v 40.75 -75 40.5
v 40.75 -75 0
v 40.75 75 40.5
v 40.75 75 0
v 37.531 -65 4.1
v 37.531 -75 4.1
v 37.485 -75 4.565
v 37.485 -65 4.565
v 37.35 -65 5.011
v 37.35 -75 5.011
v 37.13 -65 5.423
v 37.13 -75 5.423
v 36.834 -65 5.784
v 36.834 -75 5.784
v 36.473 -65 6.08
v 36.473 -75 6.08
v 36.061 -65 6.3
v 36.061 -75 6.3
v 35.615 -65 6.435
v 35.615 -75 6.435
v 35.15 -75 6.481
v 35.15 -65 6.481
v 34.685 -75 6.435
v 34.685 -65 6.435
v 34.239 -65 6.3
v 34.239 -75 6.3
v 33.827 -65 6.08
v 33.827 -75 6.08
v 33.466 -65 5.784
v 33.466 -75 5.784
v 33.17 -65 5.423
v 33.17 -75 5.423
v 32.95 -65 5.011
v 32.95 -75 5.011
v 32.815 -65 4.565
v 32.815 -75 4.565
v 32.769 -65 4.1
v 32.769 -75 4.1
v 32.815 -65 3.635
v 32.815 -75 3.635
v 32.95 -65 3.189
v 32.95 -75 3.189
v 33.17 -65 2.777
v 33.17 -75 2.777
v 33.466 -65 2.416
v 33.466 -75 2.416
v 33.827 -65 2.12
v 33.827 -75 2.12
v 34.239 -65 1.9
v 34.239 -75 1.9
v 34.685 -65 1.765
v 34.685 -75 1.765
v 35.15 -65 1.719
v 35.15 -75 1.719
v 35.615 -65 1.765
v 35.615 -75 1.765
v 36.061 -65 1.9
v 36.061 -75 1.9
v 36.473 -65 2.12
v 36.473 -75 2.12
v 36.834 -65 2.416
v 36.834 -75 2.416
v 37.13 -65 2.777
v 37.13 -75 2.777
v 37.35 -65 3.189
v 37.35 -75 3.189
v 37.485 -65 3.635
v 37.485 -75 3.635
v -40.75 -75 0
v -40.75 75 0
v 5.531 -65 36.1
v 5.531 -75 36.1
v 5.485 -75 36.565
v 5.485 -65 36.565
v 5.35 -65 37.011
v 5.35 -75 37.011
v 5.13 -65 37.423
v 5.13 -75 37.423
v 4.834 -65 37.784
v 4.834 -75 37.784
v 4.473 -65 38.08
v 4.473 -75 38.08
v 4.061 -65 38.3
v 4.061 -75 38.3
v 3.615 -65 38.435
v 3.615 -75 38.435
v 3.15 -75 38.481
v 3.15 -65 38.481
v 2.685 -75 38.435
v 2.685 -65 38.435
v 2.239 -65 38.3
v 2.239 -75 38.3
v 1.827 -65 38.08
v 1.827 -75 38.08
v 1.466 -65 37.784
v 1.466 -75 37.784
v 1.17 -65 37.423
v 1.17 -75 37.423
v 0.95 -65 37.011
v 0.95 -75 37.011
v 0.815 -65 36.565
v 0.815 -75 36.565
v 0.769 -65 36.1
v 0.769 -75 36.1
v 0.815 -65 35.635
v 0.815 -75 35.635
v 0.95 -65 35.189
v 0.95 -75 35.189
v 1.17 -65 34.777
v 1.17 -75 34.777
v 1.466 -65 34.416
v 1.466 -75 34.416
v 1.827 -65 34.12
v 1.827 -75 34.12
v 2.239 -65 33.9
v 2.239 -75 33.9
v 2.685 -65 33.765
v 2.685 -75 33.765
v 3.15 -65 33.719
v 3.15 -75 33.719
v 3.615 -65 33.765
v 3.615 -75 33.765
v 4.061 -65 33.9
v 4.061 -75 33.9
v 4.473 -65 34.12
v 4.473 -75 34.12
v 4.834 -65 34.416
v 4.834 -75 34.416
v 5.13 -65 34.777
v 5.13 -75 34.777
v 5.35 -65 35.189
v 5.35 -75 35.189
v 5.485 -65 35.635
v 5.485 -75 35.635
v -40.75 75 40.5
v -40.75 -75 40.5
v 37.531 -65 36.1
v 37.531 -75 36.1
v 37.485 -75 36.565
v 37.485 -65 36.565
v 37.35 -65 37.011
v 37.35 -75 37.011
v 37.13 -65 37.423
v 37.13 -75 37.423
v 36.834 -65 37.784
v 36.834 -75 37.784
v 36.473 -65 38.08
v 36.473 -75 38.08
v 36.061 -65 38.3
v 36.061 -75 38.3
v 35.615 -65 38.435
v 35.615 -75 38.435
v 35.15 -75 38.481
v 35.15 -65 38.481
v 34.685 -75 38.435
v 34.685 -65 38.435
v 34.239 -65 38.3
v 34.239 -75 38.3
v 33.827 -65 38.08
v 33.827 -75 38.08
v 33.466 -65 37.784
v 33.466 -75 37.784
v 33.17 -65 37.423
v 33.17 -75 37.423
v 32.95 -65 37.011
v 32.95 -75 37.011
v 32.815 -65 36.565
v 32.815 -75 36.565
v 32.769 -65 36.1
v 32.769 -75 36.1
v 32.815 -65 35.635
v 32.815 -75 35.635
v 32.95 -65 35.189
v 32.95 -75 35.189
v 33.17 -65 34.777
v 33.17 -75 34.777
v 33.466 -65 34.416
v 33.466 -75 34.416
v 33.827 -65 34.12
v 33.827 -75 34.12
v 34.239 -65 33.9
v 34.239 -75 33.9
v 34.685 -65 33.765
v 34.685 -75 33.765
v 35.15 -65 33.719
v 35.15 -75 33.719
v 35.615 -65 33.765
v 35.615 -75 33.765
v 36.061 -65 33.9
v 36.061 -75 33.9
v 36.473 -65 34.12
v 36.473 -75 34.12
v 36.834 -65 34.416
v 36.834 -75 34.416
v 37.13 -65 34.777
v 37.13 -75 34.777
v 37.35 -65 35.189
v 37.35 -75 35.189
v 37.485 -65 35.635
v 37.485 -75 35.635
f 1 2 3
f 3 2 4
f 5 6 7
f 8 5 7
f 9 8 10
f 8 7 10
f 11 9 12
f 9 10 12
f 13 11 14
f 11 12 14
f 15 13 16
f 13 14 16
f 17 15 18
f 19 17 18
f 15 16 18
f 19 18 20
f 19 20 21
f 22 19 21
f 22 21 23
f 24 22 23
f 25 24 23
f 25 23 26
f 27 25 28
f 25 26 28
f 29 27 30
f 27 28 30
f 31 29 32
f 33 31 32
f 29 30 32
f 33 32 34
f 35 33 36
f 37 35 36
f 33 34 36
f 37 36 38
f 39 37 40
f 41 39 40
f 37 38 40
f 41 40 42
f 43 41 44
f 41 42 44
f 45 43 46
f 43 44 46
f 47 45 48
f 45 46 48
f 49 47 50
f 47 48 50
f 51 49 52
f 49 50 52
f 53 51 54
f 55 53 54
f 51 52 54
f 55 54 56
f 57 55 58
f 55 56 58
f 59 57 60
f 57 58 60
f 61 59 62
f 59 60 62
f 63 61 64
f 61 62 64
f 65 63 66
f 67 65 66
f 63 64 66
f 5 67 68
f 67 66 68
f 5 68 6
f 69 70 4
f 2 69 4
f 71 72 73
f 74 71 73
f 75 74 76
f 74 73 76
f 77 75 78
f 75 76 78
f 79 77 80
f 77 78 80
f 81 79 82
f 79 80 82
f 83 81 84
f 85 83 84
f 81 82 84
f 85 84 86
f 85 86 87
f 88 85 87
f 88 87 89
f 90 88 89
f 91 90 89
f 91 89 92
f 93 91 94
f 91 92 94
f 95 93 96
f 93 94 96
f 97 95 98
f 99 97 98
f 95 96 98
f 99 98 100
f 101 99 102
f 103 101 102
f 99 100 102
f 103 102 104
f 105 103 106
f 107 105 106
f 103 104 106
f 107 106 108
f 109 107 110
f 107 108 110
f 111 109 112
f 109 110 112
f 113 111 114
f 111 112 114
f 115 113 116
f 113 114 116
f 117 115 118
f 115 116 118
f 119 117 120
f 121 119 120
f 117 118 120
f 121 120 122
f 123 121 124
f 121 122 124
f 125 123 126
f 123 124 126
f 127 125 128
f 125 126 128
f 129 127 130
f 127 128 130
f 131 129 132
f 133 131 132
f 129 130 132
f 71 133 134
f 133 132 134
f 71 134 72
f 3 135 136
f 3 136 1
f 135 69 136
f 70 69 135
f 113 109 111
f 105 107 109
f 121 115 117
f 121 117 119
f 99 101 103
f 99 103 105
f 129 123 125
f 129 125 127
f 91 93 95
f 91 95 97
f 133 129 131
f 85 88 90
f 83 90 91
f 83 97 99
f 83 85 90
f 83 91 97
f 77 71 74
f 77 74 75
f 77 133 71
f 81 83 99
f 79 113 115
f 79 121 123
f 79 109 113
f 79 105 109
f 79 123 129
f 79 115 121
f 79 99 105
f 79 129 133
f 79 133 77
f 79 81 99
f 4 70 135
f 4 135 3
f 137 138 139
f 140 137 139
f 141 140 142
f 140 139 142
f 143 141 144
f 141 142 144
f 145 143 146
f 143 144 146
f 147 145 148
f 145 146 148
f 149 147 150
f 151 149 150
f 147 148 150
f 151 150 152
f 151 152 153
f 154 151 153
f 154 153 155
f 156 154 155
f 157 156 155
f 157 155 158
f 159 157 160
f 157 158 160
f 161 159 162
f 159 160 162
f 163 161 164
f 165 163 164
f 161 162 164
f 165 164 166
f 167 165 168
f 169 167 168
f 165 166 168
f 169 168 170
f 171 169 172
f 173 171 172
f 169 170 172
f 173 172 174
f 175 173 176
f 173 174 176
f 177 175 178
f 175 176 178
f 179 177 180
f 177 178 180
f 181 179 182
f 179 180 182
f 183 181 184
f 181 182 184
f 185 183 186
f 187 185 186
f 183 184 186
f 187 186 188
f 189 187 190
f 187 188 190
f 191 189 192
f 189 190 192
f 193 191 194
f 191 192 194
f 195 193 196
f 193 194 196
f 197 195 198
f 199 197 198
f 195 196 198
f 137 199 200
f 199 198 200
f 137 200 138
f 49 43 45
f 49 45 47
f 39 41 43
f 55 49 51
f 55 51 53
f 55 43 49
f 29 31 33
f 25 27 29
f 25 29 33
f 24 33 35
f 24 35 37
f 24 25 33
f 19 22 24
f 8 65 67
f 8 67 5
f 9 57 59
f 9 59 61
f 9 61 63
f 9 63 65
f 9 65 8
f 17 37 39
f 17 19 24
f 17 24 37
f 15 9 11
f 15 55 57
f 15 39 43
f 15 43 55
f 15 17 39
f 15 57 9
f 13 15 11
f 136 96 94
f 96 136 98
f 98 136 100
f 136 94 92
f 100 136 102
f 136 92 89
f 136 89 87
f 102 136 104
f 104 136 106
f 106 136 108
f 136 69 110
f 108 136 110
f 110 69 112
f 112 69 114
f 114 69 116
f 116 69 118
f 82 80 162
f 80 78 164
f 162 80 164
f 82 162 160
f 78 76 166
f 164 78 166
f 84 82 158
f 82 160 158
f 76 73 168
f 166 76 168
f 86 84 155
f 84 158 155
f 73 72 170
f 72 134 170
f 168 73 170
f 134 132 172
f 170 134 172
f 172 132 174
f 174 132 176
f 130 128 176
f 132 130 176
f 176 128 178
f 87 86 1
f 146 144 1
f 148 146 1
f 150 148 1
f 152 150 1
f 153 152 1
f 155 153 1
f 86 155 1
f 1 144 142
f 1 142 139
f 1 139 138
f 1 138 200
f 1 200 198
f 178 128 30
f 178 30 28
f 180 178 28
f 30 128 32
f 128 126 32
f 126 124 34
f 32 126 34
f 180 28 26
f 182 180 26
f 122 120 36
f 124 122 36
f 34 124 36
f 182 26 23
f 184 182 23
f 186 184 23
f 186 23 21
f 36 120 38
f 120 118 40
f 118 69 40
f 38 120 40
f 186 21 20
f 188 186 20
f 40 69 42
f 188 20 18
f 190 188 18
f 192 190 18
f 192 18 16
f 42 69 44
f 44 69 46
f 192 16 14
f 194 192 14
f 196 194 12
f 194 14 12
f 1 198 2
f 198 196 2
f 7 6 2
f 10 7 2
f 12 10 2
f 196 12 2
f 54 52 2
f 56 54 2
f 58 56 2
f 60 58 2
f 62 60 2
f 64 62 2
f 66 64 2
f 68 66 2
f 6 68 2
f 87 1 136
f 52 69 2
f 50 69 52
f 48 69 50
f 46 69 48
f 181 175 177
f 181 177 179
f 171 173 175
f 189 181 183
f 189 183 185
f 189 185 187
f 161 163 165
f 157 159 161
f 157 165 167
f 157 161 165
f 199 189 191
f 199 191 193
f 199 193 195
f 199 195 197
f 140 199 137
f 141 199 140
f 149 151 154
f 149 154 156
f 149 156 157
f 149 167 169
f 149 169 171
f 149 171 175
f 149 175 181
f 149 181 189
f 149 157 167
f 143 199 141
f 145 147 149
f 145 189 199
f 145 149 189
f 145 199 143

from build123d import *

# Parameters (mm, degrees)
F0_W     = 81.5
F0_H     = 150
F1_DEPTH = 40.5
F2_R     = 2.38125
F3_DEPTH = 10


with BuildPart() as f1:
    # F0 (on Top) → F1 (new body)
    with BuildSketch(Plane.XY):
        Rectangle(F0_W, F0_H)
    extrude(amount=F1_DEPTH)

    # F2 (on face) → F3 (cut)
    with BuildSketch(Plane.XZ.offset(75)):
        with Locations((35.15, 36.1)):
            Circle(F2_R)
        with Locations((35.15, 4.1)):
            Circle(F2_R)
        with Locations((3.15, 36.1)):
            Circle(F2_R)
    extrude(amount=-F3_DEPTH, mode=Mode.SUBTRACT)


solid = f1.part
